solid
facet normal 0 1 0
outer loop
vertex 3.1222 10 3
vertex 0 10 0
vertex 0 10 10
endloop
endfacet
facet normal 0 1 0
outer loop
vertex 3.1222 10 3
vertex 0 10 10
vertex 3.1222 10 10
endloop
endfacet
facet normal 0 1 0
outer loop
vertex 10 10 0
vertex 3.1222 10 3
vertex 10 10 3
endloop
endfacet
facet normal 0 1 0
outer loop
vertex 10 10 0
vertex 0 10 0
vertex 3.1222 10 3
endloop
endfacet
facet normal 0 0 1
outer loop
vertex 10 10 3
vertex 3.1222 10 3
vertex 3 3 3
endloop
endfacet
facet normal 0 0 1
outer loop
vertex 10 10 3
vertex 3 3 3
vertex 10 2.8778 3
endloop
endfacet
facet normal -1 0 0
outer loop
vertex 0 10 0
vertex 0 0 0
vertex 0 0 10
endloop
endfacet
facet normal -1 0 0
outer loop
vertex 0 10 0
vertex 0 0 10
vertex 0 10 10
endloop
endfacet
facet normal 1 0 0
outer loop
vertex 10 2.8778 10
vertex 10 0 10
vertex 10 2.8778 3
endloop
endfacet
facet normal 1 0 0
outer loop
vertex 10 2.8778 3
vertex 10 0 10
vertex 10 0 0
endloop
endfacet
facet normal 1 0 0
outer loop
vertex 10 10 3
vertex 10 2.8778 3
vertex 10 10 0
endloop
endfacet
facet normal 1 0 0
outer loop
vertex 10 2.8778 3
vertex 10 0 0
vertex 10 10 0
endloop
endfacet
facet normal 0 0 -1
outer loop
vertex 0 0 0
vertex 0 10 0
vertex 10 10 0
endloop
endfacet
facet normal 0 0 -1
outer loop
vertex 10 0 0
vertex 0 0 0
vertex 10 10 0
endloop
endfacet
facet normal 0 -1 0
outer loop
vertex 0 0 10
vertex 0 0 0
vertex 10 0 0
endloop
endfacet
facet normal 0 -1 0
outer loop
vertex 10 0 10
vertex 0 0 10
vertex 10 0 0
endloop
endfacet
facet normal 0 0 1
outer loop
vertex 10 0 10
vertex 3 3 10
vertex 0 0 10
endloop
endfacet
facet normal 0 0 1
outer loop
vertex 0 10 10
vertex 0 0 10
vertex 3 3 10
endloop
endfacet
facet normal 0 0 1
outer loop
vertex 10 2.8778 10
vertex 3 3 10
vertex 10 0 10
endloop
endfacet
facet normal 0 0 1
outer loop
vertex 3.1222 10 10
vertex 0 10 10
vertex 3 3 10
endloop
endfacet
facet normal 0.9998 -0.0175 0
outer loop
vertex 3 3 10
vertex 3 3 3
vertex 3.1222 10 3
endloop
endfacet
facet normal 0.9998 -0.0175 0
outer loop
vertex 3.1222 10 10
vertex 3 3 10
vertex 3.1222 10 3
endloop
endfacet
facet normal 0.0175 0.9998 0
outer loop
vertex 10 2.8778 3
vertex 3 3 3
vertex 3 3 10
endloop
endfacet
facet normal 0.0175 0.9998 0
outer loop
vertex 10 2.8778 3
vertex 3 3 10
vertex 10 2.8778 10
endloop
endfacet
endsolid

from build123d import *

# Parameters (mm, degrees)
BOX001_W               = 10
BOX001_H               = 10
BOX001_DEPTH           = 10
BOX001_PLACEMENT_ANGLE = 1
BOX_W                  = 10
BOX_H                  = 10
BOX_DEPTH              = 10


with BuildPart() as cub_resta:
    # Box001 → Box001 (new body)
    with BuildSketch(Plane.XY):
        with Locations((5, 5)):
            Rectangle(BOX001_W, BOX001_H)
    extrude(amount=BOX001_DEPTH)


with BuildPart() as cub_resta_1:
    # Box001 placement: moved
    add(cub_resta.part.moved(Location((3, 3, 3))).rotate(Axis((3, 3, 3), (0, 0, -1)), BOX001_PLACEMENT_ANGLE))


with BuildPart() as cut:
    # Box → Box (new body)
    with BuildSketch(Plane.XY):
        with Locations((5, 5)):
            Rectangle(BOX_W, BOX_H)
    extrude(amount=BOX_DEPTH)

    # Cut: cut Cub resta
    add(cub_resta_1.part, mode=Mode.SUBTRACT)


solid = cut.part
